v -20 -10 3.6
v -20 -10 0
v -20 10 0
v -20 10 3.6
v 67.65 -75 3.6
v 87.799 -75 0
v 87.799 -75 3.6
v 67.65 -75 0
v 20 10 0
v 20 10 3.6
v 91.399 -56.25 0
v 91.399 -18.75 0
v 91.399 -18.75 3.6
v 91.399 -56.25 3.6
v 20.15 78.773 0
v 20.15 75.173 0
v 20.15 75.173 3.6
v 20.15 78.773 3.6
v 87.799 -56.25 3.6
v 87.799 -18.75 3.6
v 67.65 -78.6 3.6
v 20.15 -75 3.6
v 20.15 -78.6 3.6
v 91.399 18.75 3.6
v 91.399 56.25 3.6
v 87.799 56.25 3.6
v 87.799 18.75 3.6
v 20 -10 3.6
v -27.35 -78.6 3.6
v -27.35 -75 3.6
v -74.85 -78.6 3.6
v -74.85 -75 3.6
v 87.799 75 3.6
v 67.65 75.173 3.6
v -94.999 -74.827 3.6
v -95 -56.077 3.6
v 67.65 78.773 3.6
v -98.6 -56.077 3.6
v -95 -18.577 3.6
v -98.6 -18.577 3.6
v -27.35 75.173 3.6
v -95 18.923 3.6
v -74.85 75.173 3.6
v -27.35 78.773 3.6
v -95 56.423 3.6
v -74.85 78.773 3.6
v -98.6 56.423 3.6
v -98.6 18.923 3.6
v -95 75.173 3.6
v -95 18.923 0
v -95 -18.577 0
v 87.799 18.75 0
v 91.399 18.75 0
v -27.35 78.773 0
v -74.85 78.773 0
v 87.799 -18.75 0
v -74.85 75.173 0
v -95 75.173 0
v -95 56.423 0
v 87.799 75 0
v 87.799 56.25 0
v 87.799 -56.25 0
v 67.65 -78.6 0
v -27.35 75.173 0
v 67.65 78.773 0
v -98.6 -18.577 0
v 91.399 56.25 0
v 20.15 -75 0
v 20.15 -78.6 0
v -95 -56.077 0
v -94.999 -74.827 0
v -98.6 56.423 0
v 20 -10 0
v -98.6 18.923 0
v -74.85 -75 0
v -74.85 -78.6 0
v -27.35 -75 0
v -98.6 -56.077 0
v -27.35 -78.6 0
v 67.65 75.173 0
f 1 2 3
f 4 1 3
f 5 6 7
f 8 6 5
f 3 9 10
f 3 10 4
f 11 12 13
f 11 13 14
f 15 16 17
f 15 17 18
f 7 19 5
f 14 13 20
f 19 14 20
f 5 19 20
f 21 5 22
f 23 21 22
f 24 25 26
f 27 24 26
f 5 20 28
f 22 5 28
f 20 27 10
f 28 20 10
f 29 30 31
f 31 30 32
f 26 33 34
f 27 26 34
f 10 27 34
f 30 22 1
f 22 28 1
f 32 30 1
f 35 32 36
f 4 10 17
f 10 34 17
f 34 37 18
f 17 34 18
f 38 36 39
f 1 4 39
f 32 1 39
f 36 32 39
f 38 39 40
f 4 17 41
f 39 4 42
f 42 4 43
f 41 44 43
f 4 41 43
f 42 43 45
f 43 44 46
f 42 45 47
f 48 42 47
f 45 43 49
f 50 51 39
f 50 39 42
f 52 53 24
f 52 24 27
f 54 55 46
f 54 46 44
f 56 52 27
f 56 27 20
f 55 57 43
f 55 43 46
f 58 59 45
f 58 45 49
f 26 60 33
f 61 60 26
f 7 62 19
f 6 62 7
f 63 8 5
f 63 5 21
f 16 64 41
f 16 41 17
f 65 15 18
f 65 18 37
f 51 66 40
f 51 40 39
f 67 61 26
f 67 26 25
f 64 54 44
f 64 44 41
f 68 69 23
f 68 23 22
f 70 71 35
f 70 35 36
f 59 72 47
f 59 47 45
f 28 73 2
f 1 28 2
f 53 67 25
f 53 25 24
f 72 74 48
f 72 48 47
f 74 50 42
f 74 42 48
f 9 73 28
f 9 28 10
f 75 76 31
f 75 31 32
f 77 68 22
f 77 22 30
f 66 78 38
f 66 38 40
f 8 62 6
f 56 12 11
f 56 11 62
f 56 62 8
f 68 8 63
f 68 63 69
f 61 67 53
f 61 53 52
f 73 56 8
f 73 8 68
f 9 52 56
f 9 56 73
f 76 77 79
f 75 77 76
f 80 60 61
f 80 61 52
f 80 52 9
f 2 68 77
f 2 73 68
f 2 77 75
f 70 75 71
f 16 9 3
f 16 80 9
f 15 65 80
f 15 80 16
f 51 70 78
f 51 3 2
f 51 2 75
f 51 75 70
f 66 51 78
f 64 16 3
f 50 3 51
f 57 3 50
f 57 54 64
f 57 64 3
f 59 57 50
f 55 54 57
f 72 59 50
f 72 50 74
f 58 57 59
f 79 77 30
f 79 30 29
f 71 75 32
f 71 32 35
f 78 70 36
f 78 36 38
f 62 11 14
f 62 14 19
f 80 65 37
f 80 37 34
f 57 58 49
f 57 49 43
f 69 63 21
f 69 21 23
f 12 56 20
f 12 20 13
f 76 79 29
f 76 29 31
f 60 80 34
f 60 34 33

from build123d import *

# Parameters (mm, degrees)
EXTRUDE_1_DEPTH     = 3.6
SKETCH_2_W          = 40
SKETCH_2_H          = 20
CUT_EXTRUDE_1_DEPTH = 10


with BuildPart() as part:
    # 草图1 → 凸台-拉伸1 (new body)
    with BuildSketch(Plane.XY):
        Polygon((-95, 75.172935312), (-74.85, 75.172935312), (-74.85, 78.772935312), (-27.35, 78.772935312), (-27.35, 75.172935312), (20.15, 75.172935312), (20.15, 78.772935312), (67.65, 78.772935312), (67.65, 75.172935312), (87.799257887, 75), (87.799257887, 56.25), (91.399257887, 56.25), (91.399257887, 18.75), (87.799257887, 18.75), (87.799257887, -18.75), (91.399257887, -18.75), (91.399257887, -56.25), (87.799257887, -56.25), (87.799257887, -75), (67.65, -75), (67.65, -78.6), (20.15, -78.6), (20.15, -75), (-27.35, -75), (-27.35, -78.6), (-74.85, -78.6), (-74.85, -75), (-94.999257886, -74.827064673), (-95, -56.077064688), (-98.6, -56.077064688), (-98.6, -18.577064688), (-95, -18.577064688), (-95, 18.922935312), (-98.6, 18.922935312), (-98.6, 56.422935312), (-95, 56.422935312), align=None)
    extrude(amount=EXTRUDE_1_DEPTH)

    # 草图2 → 切除-拉伸1 (cut)
    with BuildSketch(Plane(origin=(0, 0, 0), x_dir=(-1, 0, 0), z_dir=(0, 0, -1))):
        Rectangle(SKETCH_2_W, SKETCH_2_H)
    extrude(amount=-CUT_EXTRUDE_1_DEPTH, mode=Mode.SUBTRACT)


solid = part.part
